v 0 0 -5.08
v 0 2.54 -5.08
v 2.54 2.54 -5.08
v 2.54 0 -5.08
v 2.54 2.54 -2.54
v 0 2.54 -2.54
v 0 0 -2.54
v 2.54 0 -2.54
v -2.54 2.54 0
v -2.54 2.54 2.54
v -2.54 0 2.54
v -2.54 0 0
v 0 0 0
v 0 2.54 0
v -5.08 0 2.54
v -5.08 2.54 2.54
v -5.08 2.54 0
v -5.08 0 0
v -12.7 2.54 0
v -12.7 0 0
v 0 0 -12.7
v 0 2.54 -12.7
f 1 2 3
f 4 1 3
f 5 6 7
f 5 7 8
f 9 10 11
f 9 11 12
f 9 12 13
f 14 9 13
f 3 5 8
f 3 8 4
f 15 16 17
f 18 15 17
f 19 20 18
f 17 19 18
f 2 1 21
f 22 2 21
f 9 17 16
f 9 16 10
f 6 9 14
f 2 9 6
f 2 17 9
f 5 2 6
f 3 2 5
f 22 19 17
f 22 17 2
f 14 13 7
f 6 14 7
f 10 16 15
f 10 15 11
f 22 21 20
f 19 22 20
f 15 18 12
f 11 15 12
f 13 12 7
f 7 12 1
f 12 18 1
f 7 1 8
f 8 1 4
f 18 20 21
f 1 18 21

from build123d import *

# Parameters (mm, degrees)
BOSS_EXTRUDE1_DEPTH = 2.54
SKETCH2_W           = 2.54
SKETCH2_H           = 2.54
BOSS_EXTRUDE2_DEPTH = 2.54


with BuildPart() as part:
    # Sketch1 → Boss-Extrude1 (new body)
    with BuildSketch(Plane(origin=(0, 0, 0), x_dir=(1, 0, 0), z_dir=(0, 1, 0))):
        Polygon((0, 0), (0, 12.7), (-12.7, 0), align=None)
    extrude(amount=BOSS_EXTRUDE1_DEPTH)

    # Sketch2 → Boss-Extrude2 (add)
    with BuildSketch(Plane(origin=(0, 2.54, 0), x_dir=(1, 0, 0), z_dir=(0, 1, 0))):
        with Locations((-3.81, -1.27)):
            Rectangle(SKETCH2_W, SKETCH2_H)
        with Locations((1.27, 3.81)):
            Rectangle(SKETCH2_W, SKETCH2_H)
    extrude(amount=-BOSS_EXTRUDE2_DEPTH)


solid = part.part
